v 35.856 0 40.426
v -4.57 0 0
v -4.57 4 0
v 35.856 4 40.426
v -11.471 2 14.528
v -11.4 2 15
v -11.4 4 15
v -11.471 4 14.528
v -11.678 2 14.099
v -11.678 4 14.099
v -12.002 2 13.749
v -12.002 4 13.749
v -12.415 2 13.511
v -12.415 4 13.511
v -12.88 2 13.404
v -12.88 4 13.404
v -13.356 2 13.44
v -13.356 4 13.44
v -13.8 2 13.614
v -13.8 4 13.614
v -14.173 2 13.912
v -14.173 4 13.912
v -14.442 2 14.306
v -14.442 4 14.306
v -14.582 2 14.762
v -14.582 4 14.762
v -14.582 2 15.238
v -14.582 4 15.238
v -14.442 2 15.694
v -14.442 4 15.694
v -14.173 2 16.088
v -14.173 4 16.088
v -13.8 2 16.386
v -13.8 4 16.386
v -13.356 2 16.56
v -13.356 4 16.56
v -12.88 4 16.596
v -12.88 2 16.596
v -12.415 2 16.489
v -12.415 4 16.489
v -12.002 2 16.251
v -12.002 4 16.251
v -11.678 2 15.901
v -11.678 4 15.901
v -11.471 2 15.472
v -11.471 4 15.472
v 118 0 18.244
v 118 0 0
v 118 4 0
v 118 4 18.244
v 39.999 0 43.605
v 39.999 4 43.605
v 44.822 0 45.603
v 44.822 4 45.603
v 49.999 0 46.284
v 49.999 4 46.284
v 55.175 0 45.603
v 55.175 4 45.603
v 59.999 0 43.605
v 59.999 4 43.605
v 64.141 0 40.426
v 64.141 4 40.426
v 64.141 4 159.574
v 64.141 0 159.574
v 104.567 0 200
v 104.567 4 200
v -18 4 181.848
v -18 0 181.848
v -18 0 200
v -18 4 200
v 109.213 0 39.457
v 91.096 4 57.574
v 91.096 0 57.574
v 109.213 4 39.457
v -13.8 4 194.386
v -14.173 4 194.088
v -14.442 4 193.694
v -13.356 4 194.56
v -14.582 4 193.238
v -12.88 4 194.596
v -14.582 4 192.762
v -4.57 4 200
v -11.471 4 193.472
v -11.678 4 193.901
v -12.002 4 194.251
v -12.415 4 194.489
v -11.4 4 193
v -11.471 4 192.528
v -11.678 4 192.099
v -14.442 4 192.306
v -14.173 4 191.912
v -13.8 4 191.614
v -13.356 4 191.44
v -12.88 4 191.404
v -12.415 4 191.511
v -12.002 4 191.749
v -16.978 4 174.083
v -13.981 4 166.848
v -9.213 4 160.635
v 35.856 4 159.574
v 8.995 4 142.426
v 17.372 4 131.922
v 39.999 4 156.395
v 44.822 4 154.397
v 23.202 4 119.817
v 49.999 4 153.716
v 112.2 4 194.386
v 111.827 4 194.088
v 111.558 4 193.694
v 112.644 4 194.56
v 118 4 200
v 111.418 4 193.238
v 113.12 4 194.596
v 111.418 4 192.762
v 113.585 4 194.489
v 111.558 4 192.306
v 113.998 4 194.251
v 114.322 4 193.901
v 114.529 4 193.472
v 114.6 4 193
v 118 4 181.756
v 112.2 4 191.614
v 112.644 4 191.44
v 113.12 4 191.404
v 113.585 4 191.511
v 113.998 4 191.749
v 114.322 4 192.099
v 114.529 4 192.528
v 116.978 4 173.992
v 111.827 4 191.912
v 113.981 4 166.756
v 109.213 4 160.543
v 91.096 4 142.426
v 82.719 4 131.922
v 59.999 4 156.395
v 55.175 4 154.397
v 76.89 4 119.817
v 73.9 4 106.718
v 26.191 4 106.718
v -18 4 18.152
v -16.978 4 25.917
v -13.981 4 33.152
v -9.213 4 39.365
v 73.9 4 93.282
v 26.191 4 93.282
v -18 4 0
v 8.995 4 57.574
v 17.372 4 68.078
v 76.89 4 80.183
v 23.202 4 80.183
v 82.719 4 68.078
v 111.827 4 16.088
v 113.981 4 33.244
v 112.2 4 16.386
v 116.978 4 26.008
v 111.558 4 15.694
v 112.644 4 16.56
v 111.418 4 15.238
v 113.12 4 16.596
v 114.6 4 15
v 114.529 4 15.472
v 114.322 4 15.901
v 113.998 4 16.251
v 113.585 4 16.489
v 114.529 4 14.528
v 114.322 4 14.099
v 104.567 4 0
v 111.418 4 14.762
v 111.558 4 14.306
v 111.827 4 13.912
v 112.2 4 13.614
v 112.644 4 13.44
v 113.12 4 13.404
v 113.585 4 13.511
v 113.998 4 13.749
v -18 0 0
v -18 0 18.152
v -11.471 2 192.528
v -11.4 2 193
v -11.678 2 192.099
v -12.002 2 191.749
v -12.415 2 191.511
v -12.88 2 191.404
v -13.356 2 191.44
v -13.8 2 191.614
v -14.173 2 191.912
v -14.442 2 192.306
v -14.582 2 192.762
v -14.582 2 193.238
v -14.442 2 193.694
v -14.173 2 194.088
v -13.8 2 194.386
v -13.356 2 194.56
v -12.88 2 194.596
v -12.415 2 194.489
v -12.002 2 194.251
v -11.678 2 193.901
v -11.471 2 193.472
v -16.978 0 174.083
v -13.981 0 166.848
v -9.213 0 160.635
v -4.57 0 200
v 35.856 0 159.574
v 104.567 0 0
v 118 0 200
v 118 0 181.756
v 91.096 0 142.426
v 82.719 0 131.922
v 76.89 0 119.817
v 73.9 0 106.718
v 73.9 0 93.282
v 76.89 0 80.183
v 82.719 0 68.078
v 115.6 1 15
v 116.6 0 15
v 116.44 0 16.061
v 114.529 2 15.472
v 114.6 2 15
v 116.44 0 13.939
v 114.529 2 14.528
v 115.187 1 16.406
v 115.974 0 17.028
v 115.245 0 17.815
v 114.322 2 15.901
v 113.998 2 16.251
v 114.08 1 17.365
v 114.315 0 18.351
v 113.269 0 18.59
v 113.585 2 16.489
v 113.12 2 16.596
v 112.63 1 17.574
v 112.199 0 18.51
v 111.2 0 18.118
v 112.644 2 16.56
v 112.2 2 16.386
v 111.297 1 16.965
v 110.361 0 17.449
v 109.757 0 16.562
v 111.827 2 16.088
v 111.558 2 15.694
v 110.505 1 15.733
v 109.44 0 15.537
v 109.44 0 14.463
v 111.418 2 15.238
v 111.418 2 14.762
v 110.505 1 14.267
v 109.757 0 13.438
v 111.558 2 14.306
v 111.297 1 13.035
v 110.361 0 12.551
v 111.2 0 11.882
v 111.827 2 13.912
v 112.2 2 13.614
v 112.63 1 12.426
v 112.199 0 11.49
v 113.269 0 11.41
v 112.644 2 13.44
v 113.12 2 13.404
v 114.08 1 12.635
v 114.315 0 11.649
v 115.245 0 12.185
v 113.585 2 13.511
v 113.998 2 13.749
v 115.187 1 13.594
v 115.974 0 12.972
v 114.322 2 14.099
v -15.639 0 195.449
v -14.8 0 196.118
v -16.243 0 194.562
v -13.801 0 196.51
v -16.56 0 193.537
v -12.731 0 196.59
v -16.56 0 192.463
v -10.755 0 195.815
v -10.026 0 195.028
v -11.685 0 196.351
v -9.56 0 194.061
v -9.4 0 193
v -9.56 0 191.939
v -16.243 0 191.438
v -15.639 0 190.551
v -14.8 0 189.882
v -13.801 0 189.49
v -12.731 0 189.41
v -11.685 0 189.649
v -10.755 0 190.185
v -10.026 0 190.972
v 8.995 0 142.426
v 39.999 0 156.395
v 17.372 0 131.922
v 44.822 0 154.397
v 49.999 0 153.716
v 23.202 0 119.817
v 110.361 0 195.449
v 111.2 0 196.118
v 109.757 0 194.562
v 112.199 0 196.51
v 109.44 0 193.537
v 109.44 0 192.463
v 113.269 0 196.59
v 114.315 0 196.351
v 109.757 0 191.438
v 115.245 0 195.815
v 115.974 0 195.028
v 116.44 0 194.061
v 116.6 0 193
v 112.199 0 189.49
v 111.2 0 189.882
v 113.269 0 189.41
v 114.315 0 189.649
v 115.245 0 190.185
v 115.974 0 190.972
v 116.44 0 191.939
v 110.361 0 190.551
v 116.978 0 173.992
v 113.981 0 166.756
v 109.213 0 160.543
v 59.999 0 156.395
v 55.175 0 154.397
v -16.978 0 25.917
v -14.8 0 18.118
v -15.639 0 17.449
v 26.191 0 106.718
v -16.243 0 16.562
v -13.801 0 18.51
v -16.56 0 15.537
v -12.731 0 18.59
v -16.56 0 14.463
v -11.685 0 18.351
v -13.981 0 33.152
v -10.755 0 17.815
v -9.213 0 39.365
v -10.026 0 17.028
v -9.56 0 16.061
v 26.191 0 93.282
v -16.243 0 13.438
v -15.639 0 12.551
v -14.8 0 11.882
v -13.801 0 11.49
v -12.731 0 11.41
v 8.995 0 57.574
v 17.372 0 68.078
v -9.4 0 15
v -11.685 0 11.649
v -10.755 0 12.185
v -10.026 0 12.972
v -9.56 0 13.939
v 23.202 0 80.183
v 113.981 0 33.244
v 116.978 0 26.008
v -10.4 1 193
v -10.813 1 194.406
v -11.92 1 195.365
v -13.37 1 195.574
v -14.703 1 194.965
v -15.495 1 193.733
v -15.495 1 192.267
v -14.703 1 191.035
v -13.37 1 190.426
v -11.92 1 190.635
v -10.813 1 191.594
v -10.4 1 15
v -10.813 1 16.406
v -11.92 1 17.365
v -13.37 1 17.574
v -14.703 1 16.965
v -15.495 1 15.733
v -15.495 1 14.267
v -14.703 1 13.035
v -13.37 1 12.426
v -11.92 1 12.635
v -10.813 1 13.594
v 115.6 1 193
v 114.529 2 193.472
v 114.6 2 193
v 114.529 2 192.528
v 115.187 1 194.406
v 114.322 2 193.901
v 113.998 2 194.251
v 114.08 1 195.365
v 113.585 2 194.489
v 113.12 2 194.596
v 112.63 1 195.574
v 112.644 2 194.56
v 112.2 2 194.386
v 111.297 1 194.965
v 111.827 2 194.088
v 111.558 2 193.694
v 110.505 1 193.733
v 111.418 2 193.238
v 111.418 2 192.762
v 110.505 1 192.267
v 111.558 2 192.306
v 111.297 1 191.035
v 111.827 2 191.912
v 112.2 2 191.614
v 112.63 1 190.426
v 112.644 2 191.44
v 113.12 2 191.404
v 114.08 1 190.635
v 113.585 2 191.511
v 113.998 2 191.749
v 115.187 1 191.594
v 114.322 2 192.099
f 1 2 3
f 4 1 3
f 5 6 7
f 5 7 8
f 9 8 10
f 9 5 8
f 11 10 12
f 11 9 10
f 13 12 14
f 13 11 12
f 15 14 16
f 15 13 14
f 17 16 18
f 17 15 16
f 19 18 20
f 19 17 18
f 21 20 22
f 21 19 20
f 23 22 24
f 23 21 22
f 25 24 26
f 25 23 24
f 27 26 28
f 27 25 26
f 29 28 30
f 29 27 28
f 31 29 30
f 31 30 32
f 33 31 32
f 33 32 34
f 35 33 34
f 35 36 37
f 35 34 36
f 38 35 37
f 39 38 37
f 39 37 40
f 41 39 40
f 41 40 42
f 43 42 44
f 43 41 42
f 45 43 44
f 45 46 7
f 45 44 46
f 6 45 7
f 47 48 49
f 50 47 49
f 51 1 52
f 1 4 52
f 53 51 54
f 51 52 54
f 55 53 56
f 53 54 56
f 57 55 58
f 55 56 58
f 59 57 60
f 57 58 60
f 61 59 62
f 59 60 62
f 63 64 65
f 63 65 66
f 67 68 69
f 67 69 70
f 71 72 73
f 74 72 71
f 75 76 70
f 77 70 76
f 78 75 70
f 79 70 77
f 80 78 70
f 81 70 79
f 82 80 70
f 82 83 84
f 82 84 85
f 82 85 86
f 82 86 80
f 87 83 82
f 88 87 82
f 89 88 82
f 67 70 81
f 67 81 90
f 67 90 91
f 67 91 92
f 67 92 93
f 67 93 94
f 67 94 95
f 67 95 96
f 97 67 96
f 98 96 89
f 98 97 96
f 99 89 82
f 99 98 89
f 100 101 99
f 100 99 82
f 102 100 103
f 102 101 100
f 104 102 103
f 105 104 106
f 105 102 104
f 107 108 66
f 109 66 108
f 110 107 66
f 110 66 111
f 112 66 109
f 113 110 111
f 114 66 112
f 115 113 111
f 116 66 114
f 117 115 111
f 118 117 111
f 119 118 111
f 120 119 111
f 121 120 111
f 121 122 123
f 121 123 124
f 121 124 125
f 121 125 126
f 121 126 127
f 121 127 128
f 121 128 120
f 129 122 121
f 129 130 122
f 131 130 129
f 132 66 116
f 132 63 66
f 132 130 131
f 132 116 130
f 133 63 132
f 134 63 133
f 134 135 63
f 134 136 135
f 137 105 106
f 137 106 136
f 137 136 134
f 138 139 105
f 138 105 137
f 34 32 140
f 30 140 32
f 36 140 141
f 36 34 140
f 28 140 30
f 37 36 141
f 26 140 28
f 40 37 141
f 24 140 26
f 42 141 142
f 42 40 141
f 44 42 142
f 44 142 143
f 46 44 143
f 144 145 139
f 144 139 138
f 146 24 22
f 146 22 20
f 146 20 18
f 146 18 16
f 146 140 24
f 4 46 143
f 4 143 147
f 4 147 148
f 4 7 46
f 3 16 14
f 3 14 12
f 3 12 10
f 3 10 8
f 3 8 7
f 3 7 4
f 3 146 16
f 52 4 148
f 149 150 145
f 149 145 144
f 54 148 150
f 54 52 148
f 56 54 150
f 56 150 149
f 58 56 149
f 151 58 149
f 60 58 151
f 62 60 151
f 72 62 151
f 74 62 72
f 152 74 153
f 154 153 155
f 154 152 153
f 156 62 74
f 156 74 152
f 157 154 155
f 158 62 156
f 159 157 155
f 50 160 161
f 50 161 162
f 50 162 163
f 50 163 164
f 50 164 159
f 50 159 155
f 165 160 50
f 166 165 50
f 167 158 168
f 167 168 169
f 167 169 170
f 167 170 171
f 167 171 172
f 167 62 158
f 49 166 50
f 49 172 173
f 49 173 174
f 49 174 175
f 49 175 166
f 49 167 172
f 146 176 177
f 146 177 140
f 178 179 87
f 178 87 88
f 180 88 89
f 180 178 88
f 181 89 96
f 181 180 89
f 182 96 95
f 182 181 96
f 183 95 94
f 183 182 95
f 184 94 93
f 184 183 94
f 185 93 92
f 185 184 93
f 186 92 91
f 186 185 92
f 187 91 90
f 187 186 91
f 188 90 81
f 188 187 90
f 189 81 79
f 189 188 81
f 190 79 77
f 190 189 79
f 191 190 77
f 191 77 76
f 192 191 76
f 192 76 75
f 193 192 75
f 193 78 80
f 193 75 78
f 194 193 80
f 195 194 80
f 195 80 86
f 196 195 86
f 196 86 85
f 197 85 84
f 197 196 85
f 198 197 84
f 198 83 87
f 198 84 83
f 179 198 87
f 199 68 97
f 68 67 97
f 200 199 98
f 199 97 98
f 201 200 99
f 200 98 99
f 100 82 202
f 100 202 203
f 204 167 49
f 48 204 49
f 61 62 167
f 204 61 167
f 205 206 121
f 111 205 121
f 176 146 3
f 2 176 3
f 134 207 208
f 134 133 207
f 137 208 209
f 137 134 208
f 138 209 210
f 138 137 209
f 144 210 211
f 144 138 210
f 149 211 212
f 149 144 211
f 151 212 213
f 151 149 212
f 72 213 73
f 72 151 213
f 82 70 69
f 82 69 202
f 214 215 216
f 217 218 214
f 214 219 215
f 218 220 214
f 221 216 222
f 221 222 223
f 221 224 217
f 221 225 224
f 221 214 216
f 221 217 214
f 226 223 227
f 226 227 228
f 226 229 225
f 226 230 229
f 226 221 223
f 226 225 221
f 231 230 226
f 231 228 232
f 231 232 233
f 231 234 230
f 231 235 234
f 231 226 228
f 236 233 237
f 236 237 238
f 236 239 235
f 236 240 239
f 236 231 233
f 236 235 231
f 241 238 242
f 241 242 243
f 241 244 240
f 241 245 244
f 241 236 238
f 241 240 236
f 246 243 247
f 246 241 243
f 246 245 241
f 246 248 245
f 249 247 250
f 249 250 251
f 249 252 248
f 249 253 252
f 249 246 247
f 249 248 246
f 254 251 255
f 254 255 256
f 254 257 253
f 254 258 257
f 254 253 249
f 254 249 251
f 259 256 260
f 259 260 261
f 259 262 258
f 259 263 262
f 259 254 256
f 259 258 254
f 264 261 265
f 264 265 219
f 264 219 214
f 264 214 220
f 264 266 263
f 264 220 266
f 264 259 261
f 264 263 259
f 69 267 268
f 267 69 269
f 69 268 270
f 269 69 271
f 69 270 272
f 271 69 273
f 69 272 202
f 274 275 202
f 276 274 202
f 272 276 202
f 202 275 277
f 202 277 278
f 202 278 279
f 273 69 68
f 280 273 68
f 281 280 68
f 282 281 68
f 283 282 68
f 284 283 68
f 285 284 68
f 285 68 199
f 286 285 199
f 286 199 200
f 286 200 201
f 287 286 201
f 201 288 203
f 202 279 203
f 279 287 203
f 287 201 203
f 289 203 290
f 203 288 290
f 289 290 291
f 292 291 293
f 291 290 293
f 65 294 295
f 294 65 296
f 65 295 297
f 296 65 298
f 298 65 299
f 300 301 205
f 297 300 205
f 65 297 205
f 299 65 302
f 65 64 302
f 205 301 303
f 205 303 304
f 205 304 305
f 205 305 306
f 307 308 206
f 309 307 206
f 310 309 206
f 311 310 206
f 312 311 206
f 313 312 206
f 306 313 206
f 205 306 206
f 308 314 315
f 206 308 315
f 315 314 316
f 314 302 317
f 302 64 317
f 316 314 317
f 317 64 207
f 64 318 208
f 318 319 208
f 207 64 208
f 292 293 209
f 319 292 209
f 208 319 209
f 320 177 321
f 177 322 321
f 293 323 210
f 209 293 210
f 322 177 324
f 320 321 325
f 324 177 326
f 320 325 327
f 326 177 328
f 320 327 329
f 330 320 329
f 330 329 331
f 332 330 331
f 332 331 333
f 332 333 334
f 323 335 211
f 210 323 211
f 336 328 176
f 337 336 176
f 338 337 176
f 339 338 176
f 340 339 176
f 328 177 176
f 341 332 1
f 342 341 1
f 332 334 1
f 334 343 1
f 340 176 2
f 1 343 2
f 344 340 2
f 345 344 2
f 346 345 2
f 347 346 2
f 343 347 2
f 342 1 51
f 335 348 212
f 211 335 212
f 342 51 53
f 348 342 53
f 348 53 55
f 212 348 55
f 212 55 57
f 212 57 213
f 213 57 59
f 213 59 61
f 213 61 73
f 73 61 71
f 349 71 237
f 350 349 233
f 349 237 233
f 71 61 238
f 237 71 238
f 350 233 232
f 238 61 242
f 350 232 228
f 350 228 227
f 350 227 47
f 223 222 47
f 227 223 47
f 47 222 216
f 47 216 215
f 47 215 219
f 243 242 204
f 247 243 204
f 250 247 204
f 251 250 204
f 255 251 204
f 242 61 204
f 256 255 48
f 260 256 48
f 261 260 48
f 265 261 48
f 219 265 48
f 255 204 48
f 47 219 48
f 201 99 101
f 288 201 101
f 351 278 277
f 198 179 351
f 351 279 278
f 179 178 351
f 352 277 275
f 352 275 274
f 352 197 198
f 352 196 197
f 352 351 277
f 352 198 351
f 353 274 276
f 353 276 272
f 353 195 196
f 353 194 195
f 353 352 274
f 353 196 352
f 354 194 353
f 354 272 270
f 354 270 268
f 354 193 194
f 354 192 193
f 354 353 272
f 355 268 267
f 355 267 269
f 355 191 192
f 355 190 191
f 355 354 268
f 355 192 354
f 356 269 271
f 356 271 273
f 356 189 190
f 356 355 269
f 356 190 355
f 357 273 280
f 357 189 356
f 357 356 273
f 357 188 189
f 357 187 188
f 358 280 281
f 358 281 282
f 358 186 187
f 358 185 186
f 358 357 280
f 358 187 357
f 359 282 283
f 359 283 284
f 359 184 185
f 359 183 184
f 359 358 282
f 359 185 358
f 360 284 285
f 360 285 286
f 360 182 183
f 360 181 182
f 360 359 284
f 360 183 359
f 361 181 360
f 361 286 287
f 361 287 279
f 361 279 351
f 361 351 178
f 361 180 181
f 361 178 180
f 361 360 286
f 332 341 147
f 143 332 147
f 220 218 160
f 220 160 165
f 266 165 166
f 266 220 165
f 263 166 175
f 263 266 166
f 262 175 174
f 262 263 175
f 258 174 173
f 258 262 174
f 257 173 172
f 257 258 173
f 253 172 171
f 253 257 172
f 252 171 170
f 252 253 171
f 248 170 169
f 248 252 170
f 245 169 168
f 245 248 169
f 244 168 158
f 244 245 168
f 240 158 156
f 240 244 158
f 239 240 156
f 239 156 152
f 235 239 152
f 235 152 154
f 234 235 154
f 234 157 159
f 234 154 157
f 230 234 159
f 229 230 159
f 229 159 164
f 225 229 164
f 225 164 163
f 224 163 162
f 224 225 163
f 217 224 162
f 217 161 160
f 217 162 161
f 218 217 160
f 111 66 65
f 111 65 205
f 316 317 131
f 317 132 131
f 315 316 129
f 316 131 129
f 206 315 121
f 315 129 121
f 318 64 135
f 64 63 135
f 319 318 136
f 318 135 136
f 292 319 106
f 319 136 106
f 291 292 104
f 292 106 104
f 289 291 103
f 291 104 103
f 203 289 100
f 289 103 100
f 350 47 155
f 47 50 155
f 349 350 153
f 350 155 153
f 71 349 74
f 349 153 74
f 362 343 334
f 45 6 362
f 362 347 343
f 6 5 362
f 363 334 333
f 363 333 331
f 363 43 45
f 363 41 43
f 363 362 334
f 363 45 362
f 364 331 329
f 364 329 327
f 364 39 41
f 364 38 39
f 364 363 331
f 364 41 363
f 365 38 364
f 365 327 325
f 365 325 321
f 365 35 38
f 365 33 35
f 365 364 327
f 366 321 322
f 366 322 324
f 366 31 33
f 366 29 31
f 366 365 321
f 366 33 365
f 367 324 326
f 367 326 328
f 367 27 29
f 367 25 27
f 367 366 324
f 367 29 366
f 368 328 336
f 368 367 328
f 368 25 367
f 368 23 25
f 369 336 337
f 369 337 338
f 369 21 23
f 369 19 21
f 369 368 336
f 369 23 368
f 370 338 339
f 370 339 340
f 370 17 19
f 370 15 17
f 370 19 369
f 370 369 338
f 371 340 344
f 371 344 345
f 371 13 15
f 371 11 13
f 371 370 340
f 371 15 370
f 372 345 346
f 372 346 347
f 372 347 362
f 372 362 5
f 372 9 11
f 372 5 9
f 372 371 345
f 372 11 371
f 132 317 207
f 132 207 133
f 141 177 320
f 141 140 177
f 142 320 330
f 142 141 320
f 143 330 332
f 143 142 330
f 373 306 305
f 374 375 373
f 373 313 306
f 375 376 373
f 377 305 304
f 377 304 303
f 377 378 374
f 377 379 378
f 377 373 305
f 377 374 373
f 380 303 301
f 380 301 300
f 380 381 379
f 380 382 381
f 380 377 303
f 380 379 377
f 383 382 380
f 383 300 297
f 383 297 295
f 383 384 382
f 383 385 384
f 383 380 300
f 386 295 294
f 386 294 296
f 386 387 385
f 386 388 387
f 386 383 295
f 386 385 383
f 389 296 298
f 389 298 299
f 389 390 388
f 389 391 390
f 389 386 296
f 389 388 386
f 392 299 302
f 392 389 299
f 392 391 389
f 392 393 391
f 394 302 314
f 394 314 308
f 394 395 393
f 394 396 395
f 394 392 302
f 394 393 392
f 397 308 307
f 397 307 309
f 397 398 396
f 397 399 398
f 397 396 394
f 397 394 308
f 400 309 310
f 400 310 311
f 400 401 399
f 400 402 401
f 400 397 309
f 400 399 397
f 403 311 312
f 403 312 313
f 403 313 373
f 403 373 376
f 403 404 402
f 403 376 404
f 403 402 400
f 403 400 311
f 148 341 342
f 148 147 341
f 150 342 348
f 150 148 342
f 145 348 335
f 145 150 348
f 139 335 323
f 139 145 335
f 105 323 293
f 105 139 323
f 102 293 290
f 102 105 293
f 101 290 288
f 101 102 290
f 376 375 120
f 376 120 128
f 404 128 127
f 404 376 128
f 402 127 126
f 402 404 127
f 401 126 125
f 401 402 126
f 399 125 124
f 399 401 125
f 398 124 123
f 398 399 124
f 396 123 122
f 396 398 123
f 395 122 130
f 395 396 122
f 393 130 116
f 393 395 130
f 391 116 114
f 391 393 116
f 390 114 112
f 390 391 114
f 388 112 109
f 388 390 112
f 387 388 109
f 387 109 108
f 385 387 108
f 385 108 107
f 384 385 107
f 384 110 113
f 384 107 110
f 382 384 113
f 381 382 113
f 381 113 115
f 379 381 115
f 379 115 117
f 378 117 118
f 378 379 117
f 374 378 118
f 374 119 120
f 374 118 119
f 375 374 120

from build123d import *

# Parameters (mm, degrees)
BOX013_W               = 80
BOX013_H               = 4
BOX013_DEPTH           = 80
BOX013_PLACEMENT_ANGLE = 45
FILLET059_R            = 20
BOX017_W               = 80
BOX017_H               = 4
BOX017_DEPTH           = 80
BOX017_PLACEMENT_ANGLE = 45
FILLET060_R            = 20
BOX018_W               = 100
BOX018_H               = 4
BOX018_DEPTH           = 100
BOX018_PLACEMENT_ANGLE = 45
FILLET062_R            = 60
CYLINDER039_R          = 1.6
CYLINDER039_DEPTH      = 25
CYLINDER040_R          = 1.6
CYLINDER040_DEPTH      = 25
CYLINDER041_R          = 1.6
CYLINDER041_DEPTH      = 25
CYLINDER038_R          = 1.6
CYLINDER038_DEPTH      = 25
BOX014_W               = 100
BOX014_H               = 4
BOX014_DEPTH           = 100
BOX014_PLACEMENT_ANGLE = 45
FILLET061_R            = 60
BOX012_W               = 136
BOX012_H               = 4
BOX012_DEPTH           = 200
FILLET063_R            = 30
CHAMFER017_SIZE        = 2


with BuildPart() as fillet059:
    # Box013 → Box013 (new body)
    with BuildSketch(Plane.XY):
        with Locations((40, 2)):
            Rectangle(BOX013_W, BOX013_H)
    extrude(amount=BOX013_DEPTH)


with BuildPart() as fillet059_1:
    # Box013 placement: moved
    add(fillet059.part.moved(Location((-6.57, 0, 202))).rotate(Axis((-6.57, 0, 202), (0, 1, 0)), BOX013_PLACEMENT_ANGLE))

    # Fillet059
    fillet059_edges = [fillet059_1.edges().sort_by_distance(p)[0] for p in [
        (49.998542, 2, 145.431458),
    ]]
    fillet(fillet059_edges, radius=FILLET059_R)


with BuildPart() as fillet060:
    # Box017 → Box017 (new body)
    with BuildSketch(Plane.XY):
        with Locations((40, 2)):
            Rectangle(BOX017_W, BOX017_H)
    extrude(amount=BOX017_DEPTH)


with BuildPart() as fillet060_1:
    # Box017 placement: moved
    add(fillet060.part.moved(Location((-6.57, 0, -2))).rotate(Axis((-6.57, 0, -2), (0, 1, 0)), BOX017_PLACEMENT_ANGLE))

    # Fillet060
    fillet060_edges = [fillet060_1.edges().sort_by_distance(p)[0] for p in [
        (49.998542, 2, 54.568542),
    ]]
    fillet(fillet060_edges, radius=FILLET060_R)


with BuildPart() as fillet062:
    # Box018 → Box018 (new body)
    with BuildSketch(Plane.XY):
        with Locations((50, 2)):
            Rectangle(BOX018_W, BOX018_H)
    extrude(amount=BOX018_DEPTH)


with BuildPart() as fillet062_1:
    # Box018 placement: moved
    add(fillet062.part.moved(Location((48.67, 0, 100))).rotate(Axis((48.67, 0, 100), (0, 1, 0)), BOX018_PLACEMENT_ANGLE))

    # Fillet062
    fillet062_edges = [fillet062_1.edges().sort_by_distance(p)[0] for p in [
        (48.67, 2, 100),
    ]]
    fillet(fillet062_edges, radius=FILLET062_R)


with BuildPart() as screwholle010:
    # Cylinder039 → Cylinder039 (new body)
    with BuildSketch(Plane(origin=(113, -20, 15), x_dir=(1, 0, 0), z_dir=(0, 1, 0))):
        Circle(CYLINDER039_R)
    extrude(amount=CYLINDER039_DEPTH)


with BuildPart() as screwholle011:
    # Cylinder040 → Cylinder040 (new body)
    with BuildSketch(Plane(origin=(-13, -20, 193), x_dir=(1, 0, 0), z_dir=(0, 1, 0))):
        Circle(CYLINDER040_R)
    extrude(amount=CYLINDER040_DEPTH)


with BuildPart() as screwholle012:
    # Cylinder041 → Cylinder041 (new body)
    with BuildSketch(Plane(origin=(113, -20, 193), x_dir=(1, 0, 0), z_dir=(0, 1, 0))):
        Circle(CYLINDER041_R)
    extrude(amount=CYLINDER041_DEPTH)


with BuildPart() as screwholles:
    # Cylinder038 → Cylinder038 (new body)
    with BuildSketch(Plane(origin=(-13, -20, 15), x_dir=(1, 0, 0), z_dir=(0, 1, 0))):
        Circle(CYLINDER038_R)
    extrude(amount=CYLINDER038_DEPTH)

    # Fusion019: union ScrewHolle010, ScrewHolle011, ScrewHolle012
    add(screwholle010.part)
    add(screwholle011.part)
    add(screwholle012.part)


with BuildPart() as fusion023:
    # Box014 → Box014 (new body)
    with BuildSketch(Plane.XY):
        with Locations((50, 2)):
            Rectangle(BOX014_W, BOX014_H)
    extrude(amount=BOX014_DEPTH)


with BuildPart() as fusion023_1:
    # Box014 placement: moved
    add(fusion023.part.moved(Location((-90, 0, 100))).rotate(Axis((-90, 0, 100), (0, 1, 0)), BOX014_PLACEMENT_ANGLE))

    # Fillet061
    fillet061_edges = [fusion023_1.edges().sort_by_distance(p)[0] for p in [
        (51.421356, 2, 100),
    ]]
    fillet(fillet061_edges, radius=FILLET061_R)

    # Fusion023: union Fillet059, Fillet060, Fillet062, ScrewHolles
    add(fillet059_1.part)
    add(fillet060_1.part)
    add(fillet062_1.part)
    add(screwholles.part)


with BuildPart() as support:
    # Box012 → Box012 (new body)
    with BuildSketch(Plane(origin=(-18, 0, 0), x_dir=(1, 0, 0), z_dir=(0, 0, 1))):
        with Locations((68, 2)):
            Rectangle(BOX012_W, BOX012_H)
    extrude(amount=BOX012_DEPTH)

    # Cut008: cut Fusion023
    add(fusion023_1.part, mode=Mode.SUBTRACT)

    # Fillet063
    fillet063_edges = [support.edges().sort_by_distance(p)[0] for p in [
        (-18, 2, 30.578644),
        (118, 2, 30.67),
        (118, 2, 169.33),
        (-18, 2, 169.421356),
    ]]
    fillet(fillet063_edges, radius=FILLET063_R)

    # Chamfer017
    chamfer017_edges = [support.edges().sort_by_distance(p)[0] for p in [
        (-14.6, 0, 15),
        (-14.6, 0, 193),
        (111.4, 0, 15),
        (111.4, 0, 193),
    ]]
    chamfer(chamfer017_edges, length=CHAMFER017_SIZE)


solid = support.part
